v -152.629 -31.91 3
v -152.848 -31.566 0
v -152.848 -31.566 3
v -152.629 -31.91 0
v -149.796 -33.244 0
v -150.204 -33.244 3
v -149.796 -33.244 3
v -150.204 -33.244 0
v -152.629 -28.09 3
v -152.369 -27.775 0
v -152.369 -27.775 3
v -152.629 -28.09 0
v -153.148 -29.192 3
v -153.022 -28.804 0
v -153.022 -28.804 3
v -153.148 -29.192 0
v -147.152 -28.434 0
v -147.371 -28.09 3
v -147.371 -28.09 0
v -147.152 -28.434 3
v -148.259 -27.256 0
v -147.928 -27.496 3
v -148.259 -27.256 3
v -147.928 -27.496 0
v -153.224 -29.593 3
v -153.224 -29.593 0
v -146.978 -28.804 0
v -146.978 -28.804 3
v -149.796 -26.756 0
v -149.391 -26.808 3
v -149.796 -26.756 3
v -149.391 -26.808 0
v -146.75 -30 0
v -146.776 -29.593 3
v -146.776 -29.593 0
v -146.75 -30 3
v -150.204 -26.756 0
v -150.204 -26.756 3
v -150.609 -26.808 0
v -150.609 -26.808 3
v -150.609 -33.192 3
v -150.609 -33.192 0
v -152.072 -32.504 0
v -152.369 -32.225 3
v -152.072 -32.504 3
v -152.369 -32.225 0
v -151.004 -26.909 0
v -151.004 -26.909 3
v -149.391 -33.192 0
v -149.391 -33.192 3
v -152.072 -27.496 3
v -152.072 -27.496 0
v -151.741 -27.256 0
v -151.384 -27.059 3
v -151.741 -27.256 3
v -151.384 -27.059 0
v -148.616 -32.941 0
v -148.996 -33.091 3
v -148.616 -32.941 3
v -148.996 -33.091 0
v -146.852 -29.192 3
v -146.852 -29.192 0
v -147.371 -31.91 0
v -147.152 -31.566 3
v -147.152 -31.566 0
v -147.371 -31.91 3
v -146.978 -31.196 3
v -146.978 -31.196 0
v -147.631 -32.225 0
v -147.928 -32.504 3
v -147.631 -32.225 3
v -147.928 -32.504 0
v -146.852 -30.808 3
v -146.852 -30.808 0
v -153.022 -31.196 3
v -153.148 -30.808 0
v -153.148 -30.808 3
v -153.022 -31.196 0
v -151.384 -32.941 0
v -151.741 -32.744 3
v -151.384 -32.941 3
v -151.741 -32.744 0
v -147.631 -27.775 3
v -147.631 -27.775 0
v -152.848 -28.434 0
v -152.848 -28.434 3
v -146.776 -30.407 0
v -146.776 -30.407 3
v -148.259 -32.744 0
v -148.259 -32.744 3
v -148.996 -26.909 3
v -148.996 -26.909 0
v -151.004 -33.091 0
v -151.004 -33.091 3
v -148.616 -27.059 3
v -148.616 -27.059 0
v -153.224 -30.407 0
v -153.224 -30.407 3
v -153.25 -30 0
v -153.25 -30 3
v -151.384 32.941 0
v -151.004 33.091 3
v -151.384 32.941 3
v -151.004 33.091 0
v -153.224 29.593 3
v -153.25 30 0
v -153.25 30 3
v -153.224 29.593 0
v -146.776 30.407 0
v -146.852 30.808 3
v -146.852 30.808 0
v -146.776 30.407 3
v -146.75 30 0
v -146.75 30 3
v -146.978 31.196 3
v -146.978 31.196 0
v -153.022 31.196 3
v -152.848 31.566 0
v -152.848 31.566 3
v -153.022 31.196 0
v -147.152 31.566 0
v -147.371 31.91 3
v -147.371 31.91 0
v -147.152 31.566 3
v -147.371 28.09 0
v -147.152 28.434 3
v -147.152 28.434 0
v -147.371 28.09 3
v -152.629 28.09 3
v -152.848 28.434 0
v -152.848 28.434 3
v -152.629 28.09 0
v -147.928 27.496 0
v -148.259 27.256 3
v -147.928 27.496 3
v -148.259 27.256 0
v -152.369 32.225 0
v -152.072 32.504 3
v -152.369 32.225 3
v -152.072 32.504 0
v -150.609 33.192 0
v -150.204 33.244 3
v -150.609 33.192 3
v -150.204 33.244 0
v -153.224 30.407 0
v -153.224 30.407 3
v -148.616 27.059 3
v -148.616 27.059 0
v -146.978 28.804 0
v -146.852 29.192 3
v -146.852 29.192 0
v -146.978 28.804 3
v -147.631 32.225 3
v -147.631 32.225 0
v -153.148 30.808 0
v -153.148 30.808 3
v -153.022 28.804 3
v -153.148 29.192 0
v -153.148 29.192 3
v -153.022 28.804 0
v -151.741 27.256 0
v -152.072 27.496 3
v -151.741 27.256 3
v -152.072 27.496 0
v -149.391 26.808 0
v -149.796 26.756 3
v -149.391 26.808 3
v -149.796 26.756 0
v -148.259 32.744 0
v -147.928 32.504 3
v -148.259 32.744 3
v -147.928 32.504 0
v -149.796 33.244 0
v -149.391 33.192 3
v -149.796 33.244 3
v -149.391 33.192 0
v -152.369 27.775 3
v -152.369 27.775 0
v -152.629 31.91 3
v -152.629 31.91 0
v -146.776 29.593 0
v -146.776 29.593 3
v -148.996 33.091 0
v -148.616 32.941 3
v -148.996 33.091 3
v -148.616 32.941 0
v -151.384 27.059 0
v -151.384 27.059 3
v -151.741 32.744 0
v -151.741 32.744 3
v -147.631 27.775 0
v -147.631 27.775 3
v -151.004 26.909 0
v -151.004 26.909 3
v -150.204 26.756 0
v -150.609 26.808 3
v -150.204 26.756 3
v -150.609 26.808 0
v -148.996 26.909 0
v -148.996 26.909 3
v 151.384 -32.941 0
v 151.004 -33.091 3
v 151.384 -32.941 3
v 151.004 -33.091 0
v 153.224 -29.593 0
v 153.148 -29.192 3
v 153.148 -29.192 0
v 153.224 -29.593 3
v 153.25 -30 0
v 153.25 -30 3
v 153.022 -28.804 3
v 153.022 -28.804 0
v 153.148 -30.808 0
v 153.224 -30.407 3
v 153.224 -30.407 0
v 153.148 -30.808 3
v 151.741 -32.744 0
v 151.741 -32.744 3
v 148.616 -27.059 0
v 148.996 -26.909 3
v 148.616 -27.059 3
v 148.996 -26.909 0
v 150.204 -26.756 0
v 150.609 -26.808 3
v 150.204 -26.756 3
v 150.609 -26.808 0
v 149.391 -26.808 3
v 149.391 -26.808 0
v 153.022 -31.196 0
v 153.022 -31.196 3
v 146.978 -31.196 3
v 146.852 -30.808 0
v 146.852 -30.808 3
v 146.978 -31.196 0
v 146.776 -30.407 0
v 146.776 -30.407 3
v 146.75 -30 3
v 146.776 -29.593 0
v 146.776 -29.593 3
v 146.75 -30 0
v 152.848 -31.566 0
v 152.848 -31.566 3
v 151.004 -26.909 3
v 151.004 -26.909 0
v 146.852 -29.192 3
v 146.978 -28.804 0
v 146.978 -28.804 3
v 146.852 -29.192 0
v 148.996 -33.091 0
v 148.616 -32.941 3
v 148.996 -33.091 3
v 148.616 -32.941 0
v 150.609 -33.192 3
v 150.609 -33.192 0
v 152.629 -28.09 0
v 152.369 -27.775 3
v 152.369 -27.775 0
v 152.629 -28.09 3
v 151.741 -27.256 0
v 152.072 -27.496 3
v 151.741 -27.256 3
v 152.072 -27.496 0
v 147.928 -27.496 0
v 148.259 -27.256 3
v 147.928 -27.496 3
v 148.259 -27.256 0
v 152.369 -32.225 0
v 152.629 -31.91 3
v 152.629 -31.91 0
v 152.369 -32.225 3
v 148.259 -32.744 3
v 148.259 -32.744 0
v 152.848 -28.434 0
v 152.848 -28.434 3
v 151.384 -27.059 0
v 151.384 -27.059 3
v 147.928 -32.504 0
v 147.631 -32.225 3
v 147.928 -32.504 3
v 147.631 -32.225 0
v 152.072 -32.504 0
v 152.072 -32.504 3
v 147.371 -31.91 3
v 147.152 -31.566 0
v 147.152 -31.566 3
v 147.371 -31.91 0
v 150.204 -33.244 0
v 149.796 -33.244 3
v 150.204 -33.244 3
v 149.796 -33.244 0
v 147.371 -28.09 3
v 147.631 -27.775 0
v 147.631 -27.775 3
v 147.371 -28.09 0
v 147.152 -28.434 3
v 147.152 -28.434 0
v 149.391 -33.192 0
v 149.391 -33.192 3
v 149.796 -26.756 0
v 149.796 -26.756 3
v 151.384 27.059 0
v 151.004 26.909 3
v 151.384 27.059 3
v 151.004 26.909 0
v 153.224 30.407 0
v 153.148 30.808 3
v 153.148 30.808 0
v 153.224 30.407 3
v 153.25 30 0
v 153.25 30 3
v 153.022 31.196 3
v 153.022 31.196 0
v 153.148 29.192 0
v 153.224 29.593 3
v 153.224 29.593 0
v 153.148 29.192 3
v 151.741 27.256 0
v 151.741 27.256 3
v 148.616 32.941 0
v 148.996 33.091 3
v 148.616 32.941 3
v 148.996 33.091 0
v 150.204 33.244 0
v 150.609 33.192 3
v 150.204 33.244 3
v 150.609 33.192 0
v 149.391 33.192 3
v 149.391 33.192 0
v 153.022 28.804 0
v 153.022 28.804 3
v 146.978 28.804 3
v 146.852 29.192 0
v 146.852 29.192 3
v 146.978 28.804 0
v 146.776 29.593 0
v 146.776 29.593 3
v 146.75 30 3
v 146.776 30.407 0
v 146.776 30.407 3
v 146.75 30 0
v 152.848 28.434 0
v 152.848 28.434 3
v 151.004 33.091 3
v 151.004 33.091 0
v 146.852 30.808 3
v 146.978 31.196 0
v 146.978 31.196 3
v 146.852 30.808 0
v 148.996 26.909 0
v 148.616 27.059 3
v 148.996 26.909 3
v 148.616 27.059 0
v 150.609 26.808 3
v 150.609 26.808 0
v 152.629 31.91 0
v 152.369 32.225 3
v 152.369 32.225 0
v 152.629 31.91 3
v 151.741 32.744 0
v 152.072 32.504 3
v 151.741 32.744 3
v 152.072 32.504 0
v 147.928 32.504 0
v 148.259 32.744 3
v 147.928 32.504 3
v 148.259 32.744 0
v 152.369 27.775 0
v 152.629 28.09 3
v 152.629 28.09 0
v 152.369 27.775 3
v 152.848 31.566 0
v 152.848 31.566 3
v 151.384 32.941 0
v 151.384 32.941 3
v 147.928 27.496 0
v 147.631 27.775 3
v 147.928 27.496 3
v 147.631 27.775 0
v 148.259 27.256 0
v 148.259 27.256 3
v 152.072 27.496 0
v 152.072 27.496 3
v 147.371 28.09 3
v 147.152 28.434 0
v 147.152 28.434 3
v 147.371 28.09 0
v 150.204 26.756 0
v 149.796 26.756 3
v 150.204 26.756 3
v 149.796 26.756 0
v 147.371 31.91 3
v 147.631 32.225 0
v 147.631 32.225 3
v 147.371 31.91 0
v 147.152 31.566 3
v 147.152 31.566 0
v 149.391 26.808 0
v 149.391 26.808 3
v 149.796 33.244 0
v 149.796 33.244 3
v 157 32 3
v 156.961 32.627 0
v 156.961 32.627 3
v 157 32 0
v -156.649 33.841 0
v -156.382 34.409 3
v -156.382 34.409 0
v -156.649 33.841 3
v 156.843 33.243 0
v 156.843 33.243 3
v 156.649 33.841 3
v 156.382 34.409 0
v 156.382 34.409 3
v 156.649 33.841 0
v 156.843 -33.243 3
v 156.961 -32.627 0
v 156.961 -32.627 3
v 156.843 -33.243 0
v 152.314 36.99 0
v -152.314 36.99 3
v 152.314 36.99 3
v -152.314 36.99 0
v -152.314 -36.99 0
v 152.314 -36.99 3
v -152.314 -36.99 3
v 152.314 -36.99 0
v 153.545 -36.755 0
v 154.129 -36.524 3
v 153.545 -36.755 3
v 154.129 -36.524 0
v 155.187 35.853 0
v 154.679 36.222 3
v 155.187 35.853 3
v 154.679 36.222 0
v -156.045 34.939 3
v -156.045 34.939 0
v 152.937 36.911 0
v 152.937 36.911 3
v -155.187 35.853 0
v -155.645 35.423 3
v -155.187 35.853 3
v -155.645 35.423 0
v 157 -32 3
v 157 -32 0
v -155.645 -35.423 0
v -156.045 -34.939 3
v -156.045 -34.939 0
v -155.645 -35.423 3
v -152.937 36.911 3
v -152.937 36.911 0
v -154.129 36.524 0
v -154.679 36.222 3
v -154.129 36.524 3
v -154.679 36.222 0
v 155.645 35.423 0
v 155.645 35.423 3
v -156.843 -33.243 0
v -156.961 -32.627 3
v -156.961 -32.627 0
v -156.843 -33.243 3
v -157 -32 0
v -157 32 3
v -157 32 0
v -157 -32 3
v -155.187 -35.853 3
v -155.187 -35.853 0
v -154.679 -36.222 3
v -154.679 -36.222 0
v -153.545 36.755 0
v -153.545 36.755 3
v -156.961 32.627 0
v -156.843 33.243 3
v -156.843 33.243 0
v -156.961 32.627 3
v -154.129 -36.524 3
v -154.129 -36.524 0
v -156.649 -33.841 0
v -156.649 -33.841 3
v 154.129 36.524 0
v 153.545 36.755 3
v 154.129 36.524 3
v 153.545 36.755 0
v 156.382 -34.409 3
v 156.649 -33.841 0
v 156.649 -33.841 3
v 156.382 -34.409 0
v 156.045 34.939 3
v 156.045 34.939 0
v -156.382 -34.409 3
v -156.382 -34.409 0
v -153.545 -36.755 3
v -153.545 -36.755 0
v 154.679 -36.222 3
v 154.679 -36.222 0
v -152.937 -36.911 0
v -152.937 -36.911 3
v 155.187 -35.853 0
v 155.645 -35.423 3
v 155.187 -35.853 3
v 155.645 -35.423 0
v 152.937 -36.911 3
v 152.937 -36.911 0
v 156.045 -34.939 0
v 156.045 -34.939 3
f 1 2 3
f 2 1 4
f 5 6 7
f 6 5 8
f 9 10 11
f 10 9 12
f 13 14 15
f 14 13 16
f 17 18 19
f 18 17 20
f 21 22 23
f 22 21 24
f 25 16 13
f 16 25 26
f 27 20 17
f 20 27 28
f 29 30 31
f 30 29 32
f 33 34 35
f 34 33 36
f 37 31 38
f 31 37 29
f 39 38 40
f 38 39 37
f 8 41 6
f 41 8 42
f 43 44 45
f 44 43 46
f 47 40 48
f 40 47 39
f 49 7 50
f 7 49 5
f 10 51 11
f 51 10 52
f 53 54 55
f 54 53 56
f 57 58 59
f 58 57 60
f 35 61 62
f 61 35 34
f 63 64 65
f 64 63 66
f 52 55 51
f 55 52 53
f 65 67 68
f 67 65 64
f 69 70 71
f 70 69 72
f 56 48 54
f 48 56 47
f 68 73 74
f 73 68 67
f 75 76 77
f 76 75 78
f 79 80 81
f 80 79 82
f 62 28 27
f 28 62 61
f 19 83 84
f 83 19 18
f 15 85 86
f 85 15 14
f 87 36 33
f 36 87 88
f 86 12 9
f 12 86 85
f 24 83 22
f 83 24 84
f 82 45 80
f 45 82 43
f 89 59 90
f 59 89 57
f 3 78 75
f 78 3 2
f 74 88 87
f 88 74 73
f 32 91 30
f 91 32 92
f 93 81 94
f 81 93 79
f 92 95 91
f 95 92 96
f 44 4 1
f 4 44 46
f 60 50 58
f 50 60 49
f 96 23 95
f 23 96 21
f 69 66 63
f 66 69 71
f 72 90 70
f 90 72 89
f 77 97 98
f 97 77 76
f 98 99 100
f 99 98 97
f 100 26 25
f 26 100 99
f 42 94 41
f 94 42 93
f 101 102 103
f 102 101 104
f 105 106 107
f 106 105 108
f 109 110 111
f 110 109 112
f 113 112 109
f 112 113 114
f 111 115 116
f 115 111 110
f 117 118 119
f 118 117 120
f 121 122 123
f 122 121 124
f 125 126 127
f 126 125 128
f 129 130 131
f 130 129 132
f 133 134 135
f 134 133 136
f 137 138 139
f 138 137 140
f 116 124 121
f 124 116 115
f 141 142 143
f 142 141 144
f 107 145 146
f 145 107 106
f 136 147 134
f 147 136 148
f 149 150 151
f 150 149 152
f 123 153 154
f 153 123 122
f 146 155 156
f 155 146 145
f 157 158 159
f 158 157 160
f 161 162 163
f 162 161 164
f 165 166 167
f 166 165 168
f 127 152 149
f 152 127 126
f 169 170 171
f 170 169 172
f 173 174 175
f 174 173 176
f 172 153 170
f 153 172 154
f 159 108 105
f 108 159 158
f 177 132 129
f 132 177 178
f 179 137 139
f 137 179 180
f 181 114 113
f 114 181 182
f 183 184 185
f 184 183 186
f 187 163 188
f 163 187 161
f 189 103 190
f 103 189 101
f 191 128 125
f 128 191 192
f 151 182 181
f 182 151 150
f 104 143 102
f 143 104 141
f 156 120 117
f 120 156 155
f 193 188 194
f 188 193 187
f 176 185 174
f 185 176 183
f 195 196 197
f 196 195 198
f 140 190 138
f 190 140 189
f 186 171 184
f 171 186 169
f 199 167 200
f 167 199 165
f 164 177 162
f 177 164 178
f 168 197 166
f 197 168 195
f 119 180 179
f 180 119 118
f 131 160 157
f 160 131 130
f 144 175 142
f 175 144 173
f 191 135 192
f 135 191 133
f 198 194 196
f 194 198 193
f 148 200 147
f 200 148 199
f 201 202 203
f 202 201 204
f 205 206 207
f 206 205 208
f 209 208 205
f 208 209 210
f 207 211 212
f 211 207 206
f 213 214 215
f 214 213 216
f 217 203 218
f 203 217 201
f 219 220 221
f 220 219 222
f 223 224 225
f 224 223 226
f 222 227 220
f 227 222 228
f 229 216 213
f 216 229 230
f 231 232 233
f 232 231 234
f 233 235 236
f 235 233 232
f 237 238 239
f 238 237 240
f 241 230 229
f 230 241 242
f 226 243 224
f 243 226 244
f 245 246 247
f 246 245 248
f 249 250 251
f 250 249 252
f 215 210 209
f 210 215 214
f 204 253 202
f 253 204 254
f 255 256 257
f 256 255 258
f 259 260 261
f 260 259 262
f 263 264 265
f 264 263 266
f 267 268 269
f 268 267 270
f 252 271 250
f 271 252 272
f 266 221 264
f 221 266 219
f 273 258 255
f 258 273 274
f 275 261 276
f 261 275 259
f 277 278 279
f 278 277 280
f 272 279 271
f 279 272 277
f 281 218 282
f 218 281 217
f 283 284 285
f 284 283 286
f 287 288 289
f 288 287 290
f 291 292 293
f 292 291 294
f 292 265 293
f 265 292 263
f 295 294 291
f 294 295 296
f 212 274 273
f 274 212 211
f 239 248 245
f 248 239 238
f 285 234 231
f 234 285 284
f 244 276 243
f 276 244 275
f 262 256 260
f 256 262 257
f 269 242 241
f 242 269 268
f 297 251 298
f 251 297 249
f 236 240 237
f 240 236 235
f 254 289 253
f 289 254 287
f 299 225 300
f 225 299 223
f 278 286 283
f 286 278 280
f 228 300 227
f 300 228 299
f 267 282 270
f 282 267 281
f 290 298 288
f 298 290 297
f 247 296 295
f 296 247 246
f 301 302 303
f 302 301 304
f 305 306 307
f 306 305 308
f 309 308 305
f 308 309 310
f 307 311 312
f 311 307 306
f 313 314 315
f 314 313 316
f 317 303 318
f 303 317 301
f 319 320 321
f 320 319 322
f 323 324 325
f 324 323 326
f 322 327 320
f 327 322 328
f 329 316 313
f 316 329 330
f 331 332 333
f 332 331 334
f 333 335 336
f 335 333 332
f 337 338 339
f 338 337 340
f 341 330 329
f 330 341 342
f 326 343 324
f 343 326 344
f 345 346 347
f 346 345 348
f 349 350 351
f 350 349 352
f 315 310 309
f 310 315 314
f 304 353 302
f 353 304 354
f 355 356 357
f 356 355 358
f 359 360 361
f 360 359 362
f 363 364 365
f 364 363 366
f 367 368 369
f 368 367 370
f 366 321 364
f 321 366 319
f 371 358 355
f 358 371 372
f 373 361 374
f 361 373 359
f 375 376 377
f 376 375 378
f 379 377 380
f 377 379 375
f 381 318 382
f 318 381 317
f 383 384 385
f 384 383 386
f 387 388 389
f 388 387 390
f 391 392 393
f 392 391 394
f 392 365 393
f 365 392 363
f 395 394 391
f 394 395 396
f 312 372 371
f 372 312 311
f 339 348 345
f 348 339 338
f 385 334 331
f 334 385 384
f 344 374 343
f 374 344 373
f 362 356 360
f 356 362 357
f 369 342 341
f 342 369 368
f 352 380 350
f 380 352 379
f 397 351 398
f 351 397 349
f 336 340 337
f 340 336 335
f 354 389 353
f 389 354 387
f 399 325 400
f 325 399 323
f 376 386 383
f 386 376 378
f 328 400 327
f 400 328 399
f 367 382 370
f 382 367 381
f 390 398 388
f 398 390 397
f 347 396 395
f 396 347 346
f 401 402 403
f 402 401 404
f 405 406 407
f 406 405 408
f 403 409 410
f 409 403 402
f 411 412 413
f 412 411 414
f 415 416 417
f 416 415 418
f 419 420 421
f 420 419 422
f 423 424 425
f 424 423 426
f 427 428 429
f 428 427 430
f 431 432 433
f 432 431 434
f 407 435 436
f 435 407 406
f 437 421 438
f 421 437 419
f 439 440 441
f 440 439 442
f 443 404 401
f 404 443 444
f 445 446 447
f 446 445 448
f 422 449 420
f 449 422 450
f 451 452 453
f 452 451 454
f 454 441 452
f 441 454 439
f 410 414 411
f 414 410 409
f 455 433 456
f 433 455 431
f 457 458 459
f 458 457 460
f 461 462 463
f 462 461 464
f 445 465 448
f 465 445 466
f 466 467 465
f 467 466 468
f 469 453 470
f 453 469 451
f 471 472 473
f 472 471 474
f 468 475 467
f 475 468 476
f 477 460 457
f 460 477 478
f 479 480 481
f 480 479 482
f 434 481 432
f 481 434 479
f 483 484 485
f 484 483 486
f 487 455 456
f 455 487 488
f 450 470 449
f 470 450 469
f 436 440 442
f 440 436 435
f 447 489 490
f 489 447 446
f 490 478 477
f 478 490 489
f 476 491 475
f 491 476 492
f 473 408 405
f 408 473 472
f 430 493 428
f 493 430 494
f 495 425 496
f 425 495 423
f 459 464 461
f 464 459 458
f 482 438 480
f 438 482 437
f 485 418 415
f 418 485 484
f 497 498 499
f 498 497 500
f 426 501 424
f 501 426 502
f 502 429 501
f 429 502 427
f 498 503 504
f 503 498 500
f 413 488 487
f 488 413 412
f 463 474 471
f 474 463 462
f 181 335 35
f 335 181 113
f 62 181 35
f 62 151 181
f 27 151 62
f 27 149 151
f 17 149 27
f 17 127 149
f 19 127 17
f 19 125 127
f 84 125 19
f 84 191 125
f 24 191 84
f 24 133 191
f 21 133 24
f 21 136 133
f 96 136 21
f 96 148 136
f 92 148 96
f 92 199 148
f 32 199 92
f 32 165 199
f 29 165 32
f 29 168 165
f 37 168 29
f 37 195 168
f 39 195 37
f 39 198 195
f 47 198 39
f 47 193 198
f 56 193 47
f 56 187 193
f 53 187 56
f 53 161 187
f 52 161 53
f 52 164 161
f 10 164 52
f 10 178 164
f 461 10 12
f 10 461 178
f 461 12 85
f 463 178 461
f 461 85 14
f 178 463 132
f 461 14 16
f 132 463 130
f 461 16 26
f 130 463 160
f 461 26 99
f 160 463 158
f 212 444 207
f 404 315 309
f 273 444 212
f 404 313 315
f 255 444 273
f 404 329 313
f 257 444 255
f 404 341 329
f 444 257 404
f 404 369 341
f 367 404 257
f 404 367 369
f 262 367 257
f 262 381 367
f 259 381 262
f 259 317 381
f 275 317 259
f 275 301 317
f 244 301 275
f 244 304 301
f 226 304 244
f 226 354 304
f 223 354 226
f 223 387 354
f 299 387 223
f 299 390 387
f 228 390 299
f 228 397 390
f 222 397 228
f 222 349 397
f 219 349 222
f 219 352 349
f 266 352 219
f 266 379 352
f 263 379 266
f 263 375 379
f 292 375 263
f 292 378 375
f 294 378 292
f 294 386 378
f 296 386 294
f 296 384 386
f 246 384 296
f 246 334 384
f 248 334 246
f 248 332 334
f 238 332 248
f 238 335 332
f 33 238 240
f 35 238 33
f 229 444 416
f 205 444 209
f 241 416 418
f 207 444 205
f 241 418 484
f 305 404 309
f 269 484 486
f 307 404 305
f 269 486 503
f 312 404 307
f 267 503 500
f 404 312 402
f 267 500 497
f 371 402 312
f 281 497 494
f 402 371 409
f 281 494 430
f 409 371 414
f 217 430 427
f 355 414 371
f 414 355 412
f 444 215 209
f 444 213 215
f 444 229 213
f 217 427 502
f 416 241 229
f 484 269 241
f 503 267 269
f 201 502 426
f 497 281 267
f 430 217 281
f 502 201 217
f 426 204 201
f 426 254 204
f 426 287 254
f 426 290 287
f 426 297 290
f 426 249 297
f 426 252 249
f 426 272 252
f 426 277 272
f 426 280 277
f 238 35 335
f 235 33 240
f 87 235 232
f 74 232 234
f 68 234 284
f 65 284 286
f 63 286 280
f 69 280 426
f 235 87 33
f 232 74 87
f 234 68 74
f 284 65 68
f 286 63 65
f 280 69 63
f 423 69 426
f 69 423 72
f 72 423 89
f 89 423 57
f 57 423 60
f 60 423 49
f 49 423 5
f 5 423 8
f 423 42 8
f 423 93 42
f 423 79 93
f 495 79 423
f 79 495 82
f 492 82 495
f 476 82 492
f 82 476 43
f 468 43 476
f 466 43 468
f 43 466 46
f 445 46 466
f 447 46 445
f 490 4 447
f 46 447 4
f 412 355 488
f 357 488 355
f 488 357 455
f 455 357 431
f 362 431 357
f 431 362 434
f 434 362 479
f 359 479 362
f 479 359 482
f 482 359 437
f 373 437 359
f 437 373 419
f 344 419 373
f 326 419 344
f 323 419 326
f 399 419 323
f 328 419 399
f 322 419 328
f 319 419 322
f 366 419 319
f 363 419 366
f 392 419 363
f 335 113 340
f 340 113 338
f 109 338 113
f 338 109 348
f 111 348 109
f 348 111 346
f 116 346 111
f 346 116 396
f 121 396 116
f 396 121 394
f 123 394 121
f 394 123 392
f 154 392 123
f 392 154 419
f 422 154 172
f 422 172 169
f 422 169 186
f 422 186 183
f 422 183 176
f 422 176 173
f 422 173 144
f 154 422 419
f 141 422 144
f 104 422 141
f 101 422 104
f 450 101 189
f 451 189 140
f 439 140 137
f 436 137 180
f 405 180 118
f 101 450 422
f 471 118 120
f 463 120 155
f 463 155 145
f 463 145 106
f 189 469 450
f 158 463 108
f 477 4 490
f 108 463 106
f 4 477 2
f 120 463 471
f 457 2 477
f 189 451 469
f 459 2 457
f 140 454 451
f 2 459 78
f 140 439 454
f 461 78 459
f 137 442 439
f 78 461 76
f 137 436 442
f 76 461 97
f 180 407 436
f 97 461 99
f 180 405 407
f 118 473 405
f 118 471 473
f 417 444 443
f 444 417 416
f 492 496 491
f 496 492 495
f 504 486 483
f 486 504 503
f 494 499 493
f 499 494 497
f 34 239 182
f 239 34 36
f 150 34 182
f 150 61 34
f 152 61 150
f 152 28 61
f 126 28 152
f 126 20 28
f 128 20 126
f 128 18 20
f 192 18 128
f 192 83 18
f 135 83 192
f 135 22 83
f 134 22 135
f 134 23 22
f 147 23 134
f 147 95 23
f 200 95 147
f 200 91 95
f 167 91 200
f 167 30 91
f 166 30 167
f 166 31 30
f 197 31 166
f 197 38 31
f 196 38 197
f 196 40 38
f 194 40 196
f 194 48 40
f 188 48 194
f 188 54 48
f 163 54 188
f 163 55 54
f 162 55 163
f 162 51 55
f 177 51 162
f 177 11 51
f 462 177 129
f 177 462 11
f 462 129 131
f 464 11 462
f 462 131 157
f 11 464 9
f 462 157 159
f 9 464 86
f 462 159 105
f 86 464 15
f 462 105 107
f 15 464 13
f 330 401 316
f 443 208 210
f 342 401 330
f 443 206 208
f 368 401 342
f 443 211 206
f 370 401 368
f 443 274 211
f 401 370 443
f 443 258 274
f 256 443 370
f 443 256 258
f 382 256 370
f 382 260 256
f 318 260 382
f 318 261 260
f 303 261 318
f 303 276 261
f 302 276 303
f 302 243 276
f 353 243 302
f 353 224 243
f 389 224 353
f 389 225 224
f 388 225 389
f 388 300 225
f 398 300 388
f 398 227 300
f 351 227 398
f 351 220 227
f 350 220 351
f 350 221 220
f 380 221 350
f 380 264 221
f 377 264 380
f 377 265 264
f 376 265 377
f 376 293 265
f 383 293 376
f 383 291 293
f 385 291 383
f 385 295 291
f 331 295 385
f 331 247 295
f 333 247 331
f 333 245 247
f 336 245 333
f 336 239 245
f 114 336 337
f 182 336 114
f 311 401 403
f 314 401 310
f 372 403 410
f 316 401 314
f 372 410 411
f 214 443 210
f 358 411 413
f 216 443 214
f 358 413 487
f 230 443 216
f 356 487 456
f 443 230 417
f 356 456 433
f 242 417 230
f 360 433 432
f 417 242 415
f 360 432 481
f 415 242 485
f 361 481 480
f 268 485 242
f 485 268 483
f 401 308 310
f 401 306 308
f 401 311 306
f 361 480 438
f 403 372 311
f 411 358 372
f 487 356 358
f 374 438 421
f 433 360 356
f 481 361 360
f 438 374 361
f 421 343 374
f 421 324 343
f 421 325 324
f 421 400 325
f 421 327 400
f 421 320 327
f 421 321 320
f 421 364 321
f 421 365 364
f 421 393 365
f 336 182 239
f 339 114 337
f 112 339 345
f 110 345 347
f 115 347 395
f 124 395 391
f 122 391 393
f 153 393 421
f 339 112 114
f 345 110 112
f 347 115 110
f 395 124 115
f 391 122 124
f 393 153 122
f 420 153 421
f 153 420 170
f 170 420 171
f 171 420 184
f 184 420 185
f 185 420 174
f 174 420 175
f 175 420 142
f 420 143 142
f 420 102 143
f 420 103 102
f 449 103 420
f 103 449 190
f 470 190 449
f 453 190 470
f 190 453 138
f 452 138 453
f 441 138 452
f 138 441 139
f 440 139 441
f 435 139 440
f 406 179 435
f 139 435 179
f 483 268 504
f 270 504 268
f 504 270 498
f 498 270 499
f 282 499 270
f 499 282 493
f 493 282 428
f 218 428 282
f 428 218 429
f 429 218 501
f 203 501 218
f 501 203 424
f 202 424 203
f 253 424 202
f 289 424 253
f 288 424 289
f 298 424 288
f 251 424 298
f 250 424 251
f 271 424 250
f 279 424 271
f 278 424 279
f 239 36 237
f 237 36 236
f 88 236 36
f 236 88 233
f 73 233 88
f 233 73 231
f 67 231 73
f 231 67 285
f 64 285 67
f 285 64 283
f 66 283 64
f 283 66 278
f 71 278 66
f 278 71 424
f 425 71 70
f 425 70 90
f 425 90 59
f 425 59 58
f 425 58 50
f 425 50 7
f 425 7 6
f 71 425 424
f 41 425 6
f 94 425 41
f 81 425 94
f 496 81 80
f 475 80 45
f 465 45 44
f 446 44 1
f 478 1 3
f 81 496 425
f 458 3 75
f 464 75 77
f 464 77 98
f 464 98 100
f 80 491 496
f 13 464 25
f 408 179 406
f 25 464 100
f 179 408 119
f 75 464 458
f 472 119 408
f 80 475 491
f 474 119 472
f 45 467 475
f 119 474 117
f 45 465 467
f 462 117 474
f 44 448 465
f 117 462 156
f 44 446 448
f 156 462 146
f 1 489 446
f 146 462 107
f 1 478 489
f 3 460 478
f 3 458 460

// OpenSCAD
$fn = 50;


difference() {
	union() {
		hull() {
			translate(v = [-152.0000000000, 32.0000000000, 0]) {
				cylinder(h = 3, r = 5);
			}
			translate(v = [152.0000000000, 32.0000000000, 0]) {
				cylinder(h = 3, r = 5);
			}
			translate(v = [-152.0000000000, -32.0000000000, 0]) {
				cylinder(h = 3, r = 5);
			}
			translate(v = [152.0000000000, -32.0000000000, 0]) {
				cylinder(h = 3, r = 5);
			}
		}
	}
	union() {
		translate(v = [-150.0000000000, -30.0000000000, -100.0000000000]) {
			cylinder(h = 200, r = 3.2500000000);
		}
		translate(v = [-150.0000000000, 30.0000000000, -100.0000000000]) {
			cylinder(h = 200, r = 3.2500000000);
		}
		translate(v = [150.0000000000, -30.0000000000, -100.0000000000]) {
			cylinder(h = 200, r = 3.2500000000);
		}
		translate(v = [150.0000000000, 30.0000000000, -100.0000000000]) {
			cylinder(h = 200, r = 3.2500000000);
		}
	}
}
